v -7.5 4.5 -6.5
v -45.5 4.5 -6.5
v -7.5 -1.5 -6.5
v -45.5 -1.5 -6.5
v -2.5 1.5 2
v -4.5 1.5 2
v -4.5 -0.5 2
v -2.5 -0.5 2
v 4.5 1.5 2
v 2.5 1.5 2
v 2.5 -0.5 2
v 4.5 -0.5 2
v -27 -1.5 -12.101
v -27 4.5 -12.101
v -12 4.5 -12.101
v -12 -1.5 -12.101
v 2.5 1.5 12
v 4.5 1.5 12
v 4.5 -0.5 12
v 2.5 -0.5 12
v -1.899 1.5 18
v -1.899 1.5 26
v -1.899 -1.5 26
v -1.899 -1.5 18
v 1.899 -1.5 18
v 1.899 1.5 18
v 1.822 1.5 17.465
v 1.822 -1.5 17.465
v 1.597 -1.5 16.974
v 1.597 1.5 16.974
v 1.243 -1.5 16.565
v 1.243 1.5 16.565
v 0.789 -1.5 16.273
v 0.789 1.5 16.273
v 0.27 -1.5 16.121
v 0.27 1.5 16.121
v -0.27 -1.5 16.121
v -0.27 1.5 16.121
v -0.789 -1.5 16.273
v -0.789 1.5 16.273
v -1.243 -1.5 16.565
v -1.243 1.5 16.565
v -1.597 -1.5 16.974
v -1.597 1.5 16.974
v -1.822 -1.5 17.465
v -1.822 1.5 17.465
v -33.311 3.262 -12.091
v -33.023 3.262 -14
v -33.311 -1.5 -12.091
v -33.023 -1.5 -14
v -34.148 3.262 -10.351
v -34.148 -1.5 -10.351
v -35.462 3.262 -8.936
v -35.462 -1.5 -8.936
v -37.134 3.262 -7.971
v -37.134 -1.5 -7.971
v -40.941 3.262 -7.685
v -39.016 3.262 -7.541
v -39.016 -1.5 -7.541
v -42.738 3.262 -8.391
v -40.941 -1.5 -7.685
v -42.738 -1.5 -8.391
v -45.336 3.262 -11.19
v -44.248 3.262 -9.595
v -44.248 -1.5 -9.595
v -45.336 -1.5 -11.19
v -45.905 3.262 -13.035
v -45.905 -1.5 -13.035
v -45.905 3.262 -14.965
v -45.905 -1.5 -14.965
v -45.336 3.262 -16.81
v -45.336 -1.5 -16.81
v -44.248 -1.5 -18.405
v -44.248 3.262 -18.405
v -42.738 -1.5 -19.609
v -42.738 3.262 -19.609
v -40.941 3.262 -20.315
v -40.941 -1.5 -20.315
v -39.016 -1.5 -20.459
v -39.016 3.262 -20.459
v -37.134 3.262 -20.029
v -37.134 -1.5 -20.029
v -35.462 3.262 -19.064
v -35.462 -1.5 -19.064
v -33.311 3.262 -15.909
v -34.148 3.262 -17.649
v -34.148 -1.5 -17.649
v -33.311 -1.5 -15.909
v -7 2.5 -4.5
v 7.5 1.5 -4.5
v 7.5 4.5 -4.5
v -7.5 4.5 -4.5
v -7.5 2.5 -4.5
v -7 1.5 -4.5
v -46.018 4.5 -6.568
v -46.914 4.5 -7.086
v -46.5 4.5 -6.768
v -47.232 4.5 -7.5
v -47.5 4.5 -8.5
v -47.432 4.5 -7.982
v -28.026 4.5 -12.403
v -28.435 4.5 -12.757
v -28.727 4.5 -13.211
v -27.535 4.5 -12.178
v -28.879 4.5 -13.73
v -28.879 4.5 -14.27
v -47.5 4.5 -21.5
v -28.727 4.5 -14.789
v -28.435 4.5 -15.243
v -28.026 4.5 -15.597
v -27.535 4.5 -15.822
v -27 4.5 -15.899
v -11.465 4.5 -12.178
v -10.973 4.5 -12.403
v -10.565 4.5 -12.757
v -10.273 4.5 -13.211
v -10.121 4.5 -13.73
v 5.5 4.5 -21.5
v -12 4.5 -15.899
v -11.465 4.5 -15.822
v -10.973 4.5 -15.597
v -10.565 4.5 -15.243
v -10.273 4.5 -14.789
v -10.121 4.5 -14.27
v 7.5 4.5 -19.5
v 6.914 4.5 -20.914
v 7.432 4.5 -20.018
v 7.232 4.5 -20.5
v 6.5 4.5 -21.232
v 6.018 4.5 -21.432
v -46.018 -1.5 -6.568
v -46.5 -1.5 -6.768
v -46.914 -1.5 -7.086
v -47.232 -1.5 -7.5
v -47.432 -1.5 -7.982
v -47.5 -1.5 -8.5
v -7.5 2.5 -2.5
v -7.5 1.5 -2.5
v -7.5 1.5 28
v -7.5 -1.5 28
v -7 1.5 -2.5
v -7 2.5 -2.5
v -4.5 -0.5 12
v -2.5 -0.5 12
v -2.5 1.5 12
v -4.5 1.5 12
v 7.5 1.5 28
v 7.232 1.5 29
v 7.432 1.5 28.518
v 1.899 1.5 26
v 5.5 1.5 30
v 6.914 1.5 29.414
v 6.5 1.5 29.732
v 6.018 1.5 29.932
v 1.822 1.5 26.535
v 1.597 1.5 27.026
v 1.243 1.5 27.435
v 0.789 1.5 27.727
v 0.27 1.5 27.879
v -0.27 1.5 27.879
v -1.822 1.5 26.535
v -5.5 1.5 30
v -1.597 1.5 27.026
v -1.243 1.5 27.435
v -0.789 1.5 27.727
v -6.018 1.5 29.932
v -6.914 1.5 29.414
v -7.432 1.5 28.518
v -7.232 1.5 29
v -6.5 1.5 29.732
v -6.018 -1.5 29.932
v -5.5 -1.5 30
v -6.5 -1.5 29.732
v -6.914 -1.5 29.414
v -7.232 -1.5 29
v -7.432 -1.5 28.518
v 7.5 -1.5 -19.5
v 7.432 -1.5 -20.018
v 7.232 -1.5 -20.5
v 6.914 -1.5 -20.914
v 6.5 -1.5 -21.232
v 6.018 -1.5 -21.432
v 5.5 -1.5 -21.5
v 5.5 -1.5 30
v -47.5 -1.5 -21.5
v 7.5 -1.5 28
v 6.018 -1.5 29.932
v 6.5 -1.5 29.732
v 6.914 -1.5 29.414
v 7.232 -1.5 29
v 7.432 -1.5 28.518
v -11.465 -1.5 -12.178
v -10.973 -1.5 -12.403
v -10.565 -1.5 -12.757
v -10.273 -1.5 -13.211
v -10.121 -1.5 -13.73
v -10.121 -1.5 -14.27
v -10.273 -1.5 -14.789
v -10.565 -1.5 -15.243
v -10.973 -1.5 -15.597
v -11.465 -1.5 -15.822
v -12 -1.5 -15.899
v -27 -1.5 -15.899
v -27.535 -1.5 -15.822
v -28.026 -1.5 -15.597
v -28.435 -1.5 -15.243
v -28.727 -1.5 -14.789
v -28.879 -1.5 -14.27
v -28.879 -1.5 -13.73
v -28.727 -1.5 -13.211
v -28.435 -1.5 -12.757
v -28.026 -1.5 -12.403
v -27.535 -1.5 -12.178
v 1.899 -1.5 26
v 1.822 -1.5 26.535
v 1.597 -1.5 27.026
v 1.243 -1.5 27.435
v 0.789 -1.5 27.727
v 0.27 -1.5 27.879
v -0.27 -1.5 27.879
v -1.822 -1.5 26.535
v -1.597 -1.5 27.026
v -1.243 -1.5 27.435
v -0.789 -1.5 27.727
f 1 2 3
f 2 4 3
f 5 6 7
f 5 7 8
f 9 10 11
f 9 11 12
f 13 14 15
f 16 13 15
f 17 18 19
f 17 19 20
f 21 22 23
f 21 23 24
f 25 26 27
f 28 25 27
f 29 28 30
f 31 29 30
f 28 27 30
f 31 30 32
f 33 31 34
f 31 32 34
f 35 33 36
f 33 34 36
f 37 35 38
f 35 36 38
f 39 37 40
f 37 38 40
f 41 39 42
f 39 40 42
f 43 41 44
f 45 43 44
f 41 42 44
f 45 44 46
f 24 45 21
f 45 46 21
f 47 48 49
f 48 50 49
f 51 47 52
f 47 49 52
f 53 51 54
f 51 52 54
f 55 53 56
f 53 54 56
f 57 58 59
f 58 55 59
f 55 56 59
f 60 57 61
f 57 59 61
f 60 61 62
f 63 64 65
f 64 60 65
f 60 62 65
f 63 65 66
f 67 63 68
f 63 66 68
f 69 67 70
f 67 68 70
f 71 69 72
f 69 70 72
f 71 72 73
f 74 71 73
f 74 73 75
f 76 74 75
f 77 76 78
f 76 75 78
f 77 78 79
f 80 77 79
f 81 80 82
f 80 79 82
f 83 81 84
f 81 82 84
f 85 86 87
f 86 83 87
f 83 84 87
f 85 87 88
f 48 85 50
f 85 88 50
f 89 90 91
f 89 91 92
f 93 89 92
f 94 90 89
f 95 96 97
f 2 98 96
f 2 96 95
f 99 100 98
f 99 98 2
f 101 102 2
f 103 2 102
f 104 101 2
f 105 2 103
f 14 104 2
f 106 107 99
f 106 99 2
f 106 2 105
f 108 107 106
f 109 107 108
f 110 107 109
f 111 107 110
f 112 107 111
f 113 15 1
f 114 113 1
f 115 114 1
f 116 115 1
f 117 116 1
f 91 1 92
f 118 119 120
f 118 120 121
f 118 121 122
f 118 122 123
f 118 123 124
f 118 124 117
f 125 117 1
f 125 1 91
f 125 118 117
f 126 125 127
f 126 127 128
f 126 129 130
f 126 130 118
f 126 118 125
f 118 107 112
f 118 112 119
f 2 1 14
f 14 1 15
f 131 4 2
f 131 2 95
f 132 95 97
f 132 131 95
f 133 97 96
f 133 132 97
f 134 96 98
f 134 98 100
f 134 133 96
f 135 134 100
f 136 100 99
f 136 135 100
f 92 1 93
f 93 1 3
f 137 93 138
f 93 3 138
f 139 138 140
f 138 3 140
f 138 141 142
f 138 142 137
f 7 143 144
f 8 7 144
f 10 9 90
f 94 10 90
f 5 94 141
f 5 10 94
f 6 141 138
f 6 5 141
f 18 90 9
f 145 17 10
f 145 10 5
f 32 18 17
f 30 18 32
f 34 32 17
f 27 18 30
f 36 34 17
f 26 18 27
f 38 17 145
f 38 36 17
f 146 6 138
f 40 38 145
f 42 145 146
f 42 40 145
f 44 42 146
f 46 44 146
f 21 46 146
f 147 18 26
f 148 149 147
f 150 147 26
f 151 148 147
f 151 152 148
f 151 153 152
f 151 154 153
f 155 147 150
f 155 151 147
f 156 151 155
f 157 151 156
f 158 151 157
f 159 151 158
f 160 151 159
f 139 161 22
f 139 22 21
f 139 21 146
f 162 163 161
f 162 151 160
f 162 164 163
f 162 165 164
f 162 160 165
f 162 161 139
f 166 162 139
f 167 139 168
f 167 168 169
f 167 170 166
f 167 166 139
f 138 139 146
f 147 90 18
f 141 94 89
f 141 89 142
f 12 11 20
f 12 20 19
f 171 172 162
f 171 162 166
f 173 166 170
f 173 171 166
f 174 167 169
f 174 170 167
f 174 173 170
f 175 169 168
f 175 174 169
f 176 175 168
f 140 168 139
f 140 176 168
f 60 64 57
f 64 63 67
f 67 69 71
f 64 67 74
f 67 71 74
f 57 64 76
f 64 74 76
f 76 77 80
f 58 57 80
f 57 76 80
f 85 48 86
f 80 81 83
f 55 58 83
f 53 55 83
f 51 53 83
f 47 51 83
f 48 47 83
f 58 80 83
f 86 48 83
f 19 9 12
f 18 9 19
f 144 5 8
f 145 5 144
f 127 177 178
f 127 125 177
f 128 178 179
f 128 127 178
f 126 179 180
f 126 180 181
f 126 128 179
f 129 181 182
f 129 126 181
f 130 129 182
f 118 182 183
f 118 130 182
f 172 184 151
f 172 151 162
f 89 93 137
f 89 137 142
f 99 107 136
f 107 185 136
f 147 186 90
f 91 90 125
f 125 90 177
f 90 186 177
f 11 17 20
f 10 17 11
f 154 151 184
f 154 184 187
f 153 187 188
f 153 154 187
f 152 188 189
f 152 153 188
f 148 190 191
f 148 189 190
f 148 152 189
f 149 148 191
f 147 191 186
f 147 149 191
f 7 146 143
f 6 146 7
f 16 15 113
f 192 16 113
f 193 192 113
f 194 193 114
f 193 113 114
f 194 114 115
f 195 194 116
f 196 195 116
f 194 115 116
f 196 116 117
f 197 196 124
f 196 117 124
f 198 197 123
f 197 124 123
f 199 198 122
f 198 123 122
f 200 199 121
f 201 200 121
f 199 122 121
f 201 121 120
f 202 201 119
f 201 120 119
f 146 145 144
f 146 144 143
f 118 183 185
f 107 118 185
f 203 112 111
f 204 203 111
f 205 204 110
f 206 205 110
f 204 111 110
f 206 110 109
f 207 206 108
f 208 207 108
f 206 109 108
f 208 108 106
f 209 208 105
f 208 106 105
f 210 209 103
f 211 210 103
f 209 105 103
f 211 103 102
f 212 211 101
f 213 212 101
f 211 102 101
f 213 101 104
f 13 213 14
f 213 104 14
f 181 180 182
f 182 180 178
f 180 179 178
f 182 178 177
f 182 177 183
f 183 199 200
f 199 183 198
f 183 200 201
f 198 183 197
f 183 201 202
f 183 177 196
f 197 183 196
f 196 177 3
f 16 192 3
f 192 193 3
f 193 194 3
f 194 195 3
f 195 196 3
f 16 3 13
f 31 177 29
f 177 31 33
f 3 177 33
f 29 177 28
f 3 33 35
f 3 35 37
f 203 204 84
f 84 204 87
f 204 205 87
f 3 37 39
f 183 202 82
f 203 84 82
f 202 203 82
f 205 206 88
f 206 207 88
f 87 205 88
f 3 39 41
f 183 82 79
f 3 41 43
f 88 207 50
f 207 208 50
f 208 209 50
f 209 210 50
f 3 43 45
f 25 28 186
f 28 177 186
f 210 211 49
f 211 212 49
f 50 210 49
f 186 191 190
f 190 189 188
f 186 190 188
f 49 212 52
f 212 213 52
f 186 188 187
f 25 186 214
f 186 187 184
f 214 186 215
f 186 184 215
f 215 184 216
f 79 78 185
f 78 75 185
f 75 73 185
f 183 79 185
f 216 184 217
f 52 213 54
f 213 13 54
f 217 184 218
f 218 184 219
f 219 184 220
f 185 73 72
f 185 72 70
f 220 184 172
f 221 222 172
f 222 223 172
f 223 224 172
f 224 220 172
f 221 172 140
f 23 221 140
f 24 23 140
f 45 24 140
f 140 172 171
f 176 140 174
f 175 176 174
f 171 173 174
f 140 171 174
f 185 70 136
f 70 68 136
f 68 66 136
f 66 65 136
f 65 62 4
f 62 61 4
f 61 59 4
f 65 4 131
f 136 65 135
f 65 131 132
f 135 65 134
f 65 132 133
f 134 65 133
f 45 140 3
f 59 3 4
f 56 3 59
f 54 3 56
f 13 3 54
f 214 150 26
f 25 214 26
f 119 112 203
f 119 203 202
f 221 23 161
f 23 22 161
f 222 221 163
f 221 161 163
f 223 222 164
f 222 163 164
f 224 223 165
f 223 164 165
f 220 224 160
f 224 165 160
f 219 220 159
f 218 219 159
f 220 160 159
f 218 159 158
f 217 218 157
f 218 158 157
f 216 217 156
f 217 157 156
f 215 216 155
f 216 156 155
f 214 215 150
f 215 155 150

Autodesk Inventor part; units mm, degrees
ref_plane "YZ Plane" through (0, 0, 0) normal (1, 0, 0) x (0, 1, 0)
ref_plane "XZ Plane" through (0, 0, 0) normal (0, 1, 0) x (-1, 0, 0)
ref_plane "XY Plane" through (0, 0, 0) normal (0, 0, 1) x (1, 0, 0)
sketch "Sketch1" plane through (0, 0, 0) normal (0, 1, 0) x (-1, 0, 0)
  line L0 (-7.5, 30) -> (7.5, 30)
  line L1 (7.5, 30) -> (7.5, -21.5)
  line L2 (7.5, -21.5) -> (-7.5, -21.5)
  line L3 (-7.5, -21.5) -> (-7.5, 30)
  line L4 (7.5, -21.5) -> (47.5, -21.5)
  line L5 (47.5, -6.5) -> (7.5, -6.5)
  line L6 (47.5, -6.5) -> (47.5, -21.5)
  point P0 (0, 0)
  point P1 (0, -21.5)
  dimension "d30" = 15
  dimension "d31" = 21.5
  dimension "d32" = 30
  dimension "d61" = 15
  dimension "d91" = 40
extrude "Extrusion1" add sketch "Sketch1" along normal mid plane 3
sketch "Sketch4" plane through (0, 1.5, 0) normal (0, 1, 0) x (1, 0, 0)
  line L0 (7.5, 4.5) -> (-7.5, 4.5)
  line L1 (7.5, 4.5) -> (7.5, 14.5)
  line L2 (-7.5, 6.5) -> (-7.5, 4.5)
  line L3 (7.5, -30) -> (7.5, 21.5) projected
  line L4 (-7.5, 6.5) -> (-7.5, -30) projected
  line L5 (-7.5, -30) -> (7.5, -30) projected
  line L6 (7.5, 21.5) -> (-47.5, 21.5) projected
  line L7 (7.5, 21.5) -> (-7.5, 21.5)
  line L8 (-7.5, -30) -> (7.5, -30) projected
  line L9 (7.5, -30) -> (7.5, 21.5) projected
  line L10 (7.5, 21.5) -> (-47.5, 21.5) projected
  line L11 (-47.5, 6.5) -> (-7.5, 6.5) projected
  line L12 (-7.5, 6.5) -> (-7.5, -30) projected
  line L13 (-47.5, 21.5) -> (-47.5, 6.5) projected
  point P0 (0, 0)
  dimension "d89" = 2
extrude "Extrusion3" add sketch "Sketch4" along normal blind 3 contours L0 L2 L11 L13 L6 L3 L1
sketch "Sketch5" plane through (0, 1.5, 0) normal (0, 1, 0) x (1, 0, 0)
  line L0 (-2.5, -12) -> (-4.5, -12)
  line L1 (-4.5, -12) -> (-4.5, -2)
  line L2 (-4.5, -2) -> (-2.5, -2)
  line L3 (-2.5, -2) -> (-2.5, -12)
  line L4 (-2.5, -12) -> (-4.5, -2) construction
  line L5 (-4.5, -12) -> (-2.5, -2) construction
  line L6 (4.5, -12) -> (2.5, -12)
  line L7 (2.5, -12) -> (2.5, -2)
  line L8 (2.5, -2) -> (4.5, -2)
  line L9 (4.5, -2) -> (4.5, -12)
  line L10 (4.5, -12) -> (2.5, -2) construction
  line L11 (2.5, -12) -> (4.5, -2) construction
  line L12 (-3.5, -7) -> (3.5, -7) construction
  line L13 (-7.5, 4.5) -> (7.5, 4.5) projected
  point P0 (0, 0)
  point P1 (0, -7)
  dimension "d24" = 2
  dimension "d25" = 10
  dimension "d26" = 7
  dimension "d90" = 6.5
extrude "Extrusion4" cut sketch "Sketch5" against normal blind 2
sketch "Sketch6" plane through (0, 1.5, 0) normal (0, 1, 0) x (1, 0, 0)
  circle A0 centre (0, -18) radius 1.8986
  circle A1 centre (0, -26) radius 1.8986
  line L0 (1.8986, -26) -> (1.8986, -18)
  line L1 (-1.8986, -26) -> (-1.8986, -18)
  line L2 (-7.5, -30) -> (7.5, -30) projected
  point P0 (0, 0)
  dimension "d33" = 3.7973
  dimension "d36" = 3.7973
  dimension "d37" = 8
  dimension "d68" = 4
extrude "Extrusion5" cut sketch "Sketch6" against normal through all
fillet "Fillet2" radius 2 3 edges at (7.5, 1.5, -21.5) (7.5, 0, 30) (-7.5, 0, 30)
sketch "Sketch8" plane through (0, 1.5, 0) normal (0, 1, 0) x (1, 0, 0)
  line L0 (-7.5, 4.5) -> (7.5, 4.5) projected
  line L1 (-7.5, 4.5) -> (-7, 4.5)
  line L2 (-7, 4.5) -> (-7, 2.5)
  line L3 (-7, 2.5) -> (-7.5, 2.5)
  line L4 (-7.5, 2.5) -> (-7.5, 4.5)
  point P0 (0, 0)
  dimension "d74" = 0.5
  dimension "d75" = 2
extrude "Extrusion6" add sketch "Sketch8" along normal blind 1
sketch "Sketch10" plane through (0, 4.5, 0) normal (0, 1, 0) x (1, 0, 0)
  point P0 (0, 0)
sketch "Sketch11" plane through (0, 4.5, 0) normal (0, 1, 0) x (1, 0, 0)
  circle A0 centre (-27, 14) radius 1.8986
  circle A1 centre (-12, 14) radius 1.8987
  line L0 (-27, 12.1014) -> (-12, 12.1014)
  line L1 (-27, 15.8986) -> (-12, 15.8986)
  line L2 (-19.5, 6.5) -> (-19.5, 21.5) construction
  line L3 (5.5, 21.5) -> (-47.5, 21.5) construction
  line L4 (-47.5, 6.5) -> (-7.5, 6.5) projected
  line L5 (-7.5, 6.5) -> (-7.5, 4.5) projected
  point P0 (0, 0)
  point P1 (-19.5, 14)
  point P2 (-42.5, 21.5)
  point P3 (-19.5, 15.8986)
  dimension "d85" = 3.7973
  dimension "d86" = 15
  dimension "d92" = 12
extrude "Extrusion7" cut sketch "Sketch11" against normal blind 10
sketch "Sketch12" plane through (0, -1.5, 0) normal (0, 1, 0) x (1, 0, 0)
  circle A0 centre (-39.5, 14) radius 6.477
  line L0 (-47.5, 6.5) -> (-7.5, 6.5) construction
  line L1 (-39.5, 6.5) -> (-39.5, 21.5) construction
  line L2 (5.5, 21.5) -> (-47.5, 21.5) construction
  line L3 (-47.5, 6.5) -> (-47.5, 21.5) construction
  point P0 (0, 0)
  point P1 (-42.5, 21.5)
  point P2 (-47.5, 16.5)
  dimension "d93" = 12.954
  dimension "d96" = 8
extrude "Extrusion8" cut sketch "Sketch12" along normal blind 4.7625
fillet "Fillet3" radius 2 1 edges at (-47.5, 1.5, -6.5)
equation "\"d36\" = d33"
properties part number "FiberMount"
